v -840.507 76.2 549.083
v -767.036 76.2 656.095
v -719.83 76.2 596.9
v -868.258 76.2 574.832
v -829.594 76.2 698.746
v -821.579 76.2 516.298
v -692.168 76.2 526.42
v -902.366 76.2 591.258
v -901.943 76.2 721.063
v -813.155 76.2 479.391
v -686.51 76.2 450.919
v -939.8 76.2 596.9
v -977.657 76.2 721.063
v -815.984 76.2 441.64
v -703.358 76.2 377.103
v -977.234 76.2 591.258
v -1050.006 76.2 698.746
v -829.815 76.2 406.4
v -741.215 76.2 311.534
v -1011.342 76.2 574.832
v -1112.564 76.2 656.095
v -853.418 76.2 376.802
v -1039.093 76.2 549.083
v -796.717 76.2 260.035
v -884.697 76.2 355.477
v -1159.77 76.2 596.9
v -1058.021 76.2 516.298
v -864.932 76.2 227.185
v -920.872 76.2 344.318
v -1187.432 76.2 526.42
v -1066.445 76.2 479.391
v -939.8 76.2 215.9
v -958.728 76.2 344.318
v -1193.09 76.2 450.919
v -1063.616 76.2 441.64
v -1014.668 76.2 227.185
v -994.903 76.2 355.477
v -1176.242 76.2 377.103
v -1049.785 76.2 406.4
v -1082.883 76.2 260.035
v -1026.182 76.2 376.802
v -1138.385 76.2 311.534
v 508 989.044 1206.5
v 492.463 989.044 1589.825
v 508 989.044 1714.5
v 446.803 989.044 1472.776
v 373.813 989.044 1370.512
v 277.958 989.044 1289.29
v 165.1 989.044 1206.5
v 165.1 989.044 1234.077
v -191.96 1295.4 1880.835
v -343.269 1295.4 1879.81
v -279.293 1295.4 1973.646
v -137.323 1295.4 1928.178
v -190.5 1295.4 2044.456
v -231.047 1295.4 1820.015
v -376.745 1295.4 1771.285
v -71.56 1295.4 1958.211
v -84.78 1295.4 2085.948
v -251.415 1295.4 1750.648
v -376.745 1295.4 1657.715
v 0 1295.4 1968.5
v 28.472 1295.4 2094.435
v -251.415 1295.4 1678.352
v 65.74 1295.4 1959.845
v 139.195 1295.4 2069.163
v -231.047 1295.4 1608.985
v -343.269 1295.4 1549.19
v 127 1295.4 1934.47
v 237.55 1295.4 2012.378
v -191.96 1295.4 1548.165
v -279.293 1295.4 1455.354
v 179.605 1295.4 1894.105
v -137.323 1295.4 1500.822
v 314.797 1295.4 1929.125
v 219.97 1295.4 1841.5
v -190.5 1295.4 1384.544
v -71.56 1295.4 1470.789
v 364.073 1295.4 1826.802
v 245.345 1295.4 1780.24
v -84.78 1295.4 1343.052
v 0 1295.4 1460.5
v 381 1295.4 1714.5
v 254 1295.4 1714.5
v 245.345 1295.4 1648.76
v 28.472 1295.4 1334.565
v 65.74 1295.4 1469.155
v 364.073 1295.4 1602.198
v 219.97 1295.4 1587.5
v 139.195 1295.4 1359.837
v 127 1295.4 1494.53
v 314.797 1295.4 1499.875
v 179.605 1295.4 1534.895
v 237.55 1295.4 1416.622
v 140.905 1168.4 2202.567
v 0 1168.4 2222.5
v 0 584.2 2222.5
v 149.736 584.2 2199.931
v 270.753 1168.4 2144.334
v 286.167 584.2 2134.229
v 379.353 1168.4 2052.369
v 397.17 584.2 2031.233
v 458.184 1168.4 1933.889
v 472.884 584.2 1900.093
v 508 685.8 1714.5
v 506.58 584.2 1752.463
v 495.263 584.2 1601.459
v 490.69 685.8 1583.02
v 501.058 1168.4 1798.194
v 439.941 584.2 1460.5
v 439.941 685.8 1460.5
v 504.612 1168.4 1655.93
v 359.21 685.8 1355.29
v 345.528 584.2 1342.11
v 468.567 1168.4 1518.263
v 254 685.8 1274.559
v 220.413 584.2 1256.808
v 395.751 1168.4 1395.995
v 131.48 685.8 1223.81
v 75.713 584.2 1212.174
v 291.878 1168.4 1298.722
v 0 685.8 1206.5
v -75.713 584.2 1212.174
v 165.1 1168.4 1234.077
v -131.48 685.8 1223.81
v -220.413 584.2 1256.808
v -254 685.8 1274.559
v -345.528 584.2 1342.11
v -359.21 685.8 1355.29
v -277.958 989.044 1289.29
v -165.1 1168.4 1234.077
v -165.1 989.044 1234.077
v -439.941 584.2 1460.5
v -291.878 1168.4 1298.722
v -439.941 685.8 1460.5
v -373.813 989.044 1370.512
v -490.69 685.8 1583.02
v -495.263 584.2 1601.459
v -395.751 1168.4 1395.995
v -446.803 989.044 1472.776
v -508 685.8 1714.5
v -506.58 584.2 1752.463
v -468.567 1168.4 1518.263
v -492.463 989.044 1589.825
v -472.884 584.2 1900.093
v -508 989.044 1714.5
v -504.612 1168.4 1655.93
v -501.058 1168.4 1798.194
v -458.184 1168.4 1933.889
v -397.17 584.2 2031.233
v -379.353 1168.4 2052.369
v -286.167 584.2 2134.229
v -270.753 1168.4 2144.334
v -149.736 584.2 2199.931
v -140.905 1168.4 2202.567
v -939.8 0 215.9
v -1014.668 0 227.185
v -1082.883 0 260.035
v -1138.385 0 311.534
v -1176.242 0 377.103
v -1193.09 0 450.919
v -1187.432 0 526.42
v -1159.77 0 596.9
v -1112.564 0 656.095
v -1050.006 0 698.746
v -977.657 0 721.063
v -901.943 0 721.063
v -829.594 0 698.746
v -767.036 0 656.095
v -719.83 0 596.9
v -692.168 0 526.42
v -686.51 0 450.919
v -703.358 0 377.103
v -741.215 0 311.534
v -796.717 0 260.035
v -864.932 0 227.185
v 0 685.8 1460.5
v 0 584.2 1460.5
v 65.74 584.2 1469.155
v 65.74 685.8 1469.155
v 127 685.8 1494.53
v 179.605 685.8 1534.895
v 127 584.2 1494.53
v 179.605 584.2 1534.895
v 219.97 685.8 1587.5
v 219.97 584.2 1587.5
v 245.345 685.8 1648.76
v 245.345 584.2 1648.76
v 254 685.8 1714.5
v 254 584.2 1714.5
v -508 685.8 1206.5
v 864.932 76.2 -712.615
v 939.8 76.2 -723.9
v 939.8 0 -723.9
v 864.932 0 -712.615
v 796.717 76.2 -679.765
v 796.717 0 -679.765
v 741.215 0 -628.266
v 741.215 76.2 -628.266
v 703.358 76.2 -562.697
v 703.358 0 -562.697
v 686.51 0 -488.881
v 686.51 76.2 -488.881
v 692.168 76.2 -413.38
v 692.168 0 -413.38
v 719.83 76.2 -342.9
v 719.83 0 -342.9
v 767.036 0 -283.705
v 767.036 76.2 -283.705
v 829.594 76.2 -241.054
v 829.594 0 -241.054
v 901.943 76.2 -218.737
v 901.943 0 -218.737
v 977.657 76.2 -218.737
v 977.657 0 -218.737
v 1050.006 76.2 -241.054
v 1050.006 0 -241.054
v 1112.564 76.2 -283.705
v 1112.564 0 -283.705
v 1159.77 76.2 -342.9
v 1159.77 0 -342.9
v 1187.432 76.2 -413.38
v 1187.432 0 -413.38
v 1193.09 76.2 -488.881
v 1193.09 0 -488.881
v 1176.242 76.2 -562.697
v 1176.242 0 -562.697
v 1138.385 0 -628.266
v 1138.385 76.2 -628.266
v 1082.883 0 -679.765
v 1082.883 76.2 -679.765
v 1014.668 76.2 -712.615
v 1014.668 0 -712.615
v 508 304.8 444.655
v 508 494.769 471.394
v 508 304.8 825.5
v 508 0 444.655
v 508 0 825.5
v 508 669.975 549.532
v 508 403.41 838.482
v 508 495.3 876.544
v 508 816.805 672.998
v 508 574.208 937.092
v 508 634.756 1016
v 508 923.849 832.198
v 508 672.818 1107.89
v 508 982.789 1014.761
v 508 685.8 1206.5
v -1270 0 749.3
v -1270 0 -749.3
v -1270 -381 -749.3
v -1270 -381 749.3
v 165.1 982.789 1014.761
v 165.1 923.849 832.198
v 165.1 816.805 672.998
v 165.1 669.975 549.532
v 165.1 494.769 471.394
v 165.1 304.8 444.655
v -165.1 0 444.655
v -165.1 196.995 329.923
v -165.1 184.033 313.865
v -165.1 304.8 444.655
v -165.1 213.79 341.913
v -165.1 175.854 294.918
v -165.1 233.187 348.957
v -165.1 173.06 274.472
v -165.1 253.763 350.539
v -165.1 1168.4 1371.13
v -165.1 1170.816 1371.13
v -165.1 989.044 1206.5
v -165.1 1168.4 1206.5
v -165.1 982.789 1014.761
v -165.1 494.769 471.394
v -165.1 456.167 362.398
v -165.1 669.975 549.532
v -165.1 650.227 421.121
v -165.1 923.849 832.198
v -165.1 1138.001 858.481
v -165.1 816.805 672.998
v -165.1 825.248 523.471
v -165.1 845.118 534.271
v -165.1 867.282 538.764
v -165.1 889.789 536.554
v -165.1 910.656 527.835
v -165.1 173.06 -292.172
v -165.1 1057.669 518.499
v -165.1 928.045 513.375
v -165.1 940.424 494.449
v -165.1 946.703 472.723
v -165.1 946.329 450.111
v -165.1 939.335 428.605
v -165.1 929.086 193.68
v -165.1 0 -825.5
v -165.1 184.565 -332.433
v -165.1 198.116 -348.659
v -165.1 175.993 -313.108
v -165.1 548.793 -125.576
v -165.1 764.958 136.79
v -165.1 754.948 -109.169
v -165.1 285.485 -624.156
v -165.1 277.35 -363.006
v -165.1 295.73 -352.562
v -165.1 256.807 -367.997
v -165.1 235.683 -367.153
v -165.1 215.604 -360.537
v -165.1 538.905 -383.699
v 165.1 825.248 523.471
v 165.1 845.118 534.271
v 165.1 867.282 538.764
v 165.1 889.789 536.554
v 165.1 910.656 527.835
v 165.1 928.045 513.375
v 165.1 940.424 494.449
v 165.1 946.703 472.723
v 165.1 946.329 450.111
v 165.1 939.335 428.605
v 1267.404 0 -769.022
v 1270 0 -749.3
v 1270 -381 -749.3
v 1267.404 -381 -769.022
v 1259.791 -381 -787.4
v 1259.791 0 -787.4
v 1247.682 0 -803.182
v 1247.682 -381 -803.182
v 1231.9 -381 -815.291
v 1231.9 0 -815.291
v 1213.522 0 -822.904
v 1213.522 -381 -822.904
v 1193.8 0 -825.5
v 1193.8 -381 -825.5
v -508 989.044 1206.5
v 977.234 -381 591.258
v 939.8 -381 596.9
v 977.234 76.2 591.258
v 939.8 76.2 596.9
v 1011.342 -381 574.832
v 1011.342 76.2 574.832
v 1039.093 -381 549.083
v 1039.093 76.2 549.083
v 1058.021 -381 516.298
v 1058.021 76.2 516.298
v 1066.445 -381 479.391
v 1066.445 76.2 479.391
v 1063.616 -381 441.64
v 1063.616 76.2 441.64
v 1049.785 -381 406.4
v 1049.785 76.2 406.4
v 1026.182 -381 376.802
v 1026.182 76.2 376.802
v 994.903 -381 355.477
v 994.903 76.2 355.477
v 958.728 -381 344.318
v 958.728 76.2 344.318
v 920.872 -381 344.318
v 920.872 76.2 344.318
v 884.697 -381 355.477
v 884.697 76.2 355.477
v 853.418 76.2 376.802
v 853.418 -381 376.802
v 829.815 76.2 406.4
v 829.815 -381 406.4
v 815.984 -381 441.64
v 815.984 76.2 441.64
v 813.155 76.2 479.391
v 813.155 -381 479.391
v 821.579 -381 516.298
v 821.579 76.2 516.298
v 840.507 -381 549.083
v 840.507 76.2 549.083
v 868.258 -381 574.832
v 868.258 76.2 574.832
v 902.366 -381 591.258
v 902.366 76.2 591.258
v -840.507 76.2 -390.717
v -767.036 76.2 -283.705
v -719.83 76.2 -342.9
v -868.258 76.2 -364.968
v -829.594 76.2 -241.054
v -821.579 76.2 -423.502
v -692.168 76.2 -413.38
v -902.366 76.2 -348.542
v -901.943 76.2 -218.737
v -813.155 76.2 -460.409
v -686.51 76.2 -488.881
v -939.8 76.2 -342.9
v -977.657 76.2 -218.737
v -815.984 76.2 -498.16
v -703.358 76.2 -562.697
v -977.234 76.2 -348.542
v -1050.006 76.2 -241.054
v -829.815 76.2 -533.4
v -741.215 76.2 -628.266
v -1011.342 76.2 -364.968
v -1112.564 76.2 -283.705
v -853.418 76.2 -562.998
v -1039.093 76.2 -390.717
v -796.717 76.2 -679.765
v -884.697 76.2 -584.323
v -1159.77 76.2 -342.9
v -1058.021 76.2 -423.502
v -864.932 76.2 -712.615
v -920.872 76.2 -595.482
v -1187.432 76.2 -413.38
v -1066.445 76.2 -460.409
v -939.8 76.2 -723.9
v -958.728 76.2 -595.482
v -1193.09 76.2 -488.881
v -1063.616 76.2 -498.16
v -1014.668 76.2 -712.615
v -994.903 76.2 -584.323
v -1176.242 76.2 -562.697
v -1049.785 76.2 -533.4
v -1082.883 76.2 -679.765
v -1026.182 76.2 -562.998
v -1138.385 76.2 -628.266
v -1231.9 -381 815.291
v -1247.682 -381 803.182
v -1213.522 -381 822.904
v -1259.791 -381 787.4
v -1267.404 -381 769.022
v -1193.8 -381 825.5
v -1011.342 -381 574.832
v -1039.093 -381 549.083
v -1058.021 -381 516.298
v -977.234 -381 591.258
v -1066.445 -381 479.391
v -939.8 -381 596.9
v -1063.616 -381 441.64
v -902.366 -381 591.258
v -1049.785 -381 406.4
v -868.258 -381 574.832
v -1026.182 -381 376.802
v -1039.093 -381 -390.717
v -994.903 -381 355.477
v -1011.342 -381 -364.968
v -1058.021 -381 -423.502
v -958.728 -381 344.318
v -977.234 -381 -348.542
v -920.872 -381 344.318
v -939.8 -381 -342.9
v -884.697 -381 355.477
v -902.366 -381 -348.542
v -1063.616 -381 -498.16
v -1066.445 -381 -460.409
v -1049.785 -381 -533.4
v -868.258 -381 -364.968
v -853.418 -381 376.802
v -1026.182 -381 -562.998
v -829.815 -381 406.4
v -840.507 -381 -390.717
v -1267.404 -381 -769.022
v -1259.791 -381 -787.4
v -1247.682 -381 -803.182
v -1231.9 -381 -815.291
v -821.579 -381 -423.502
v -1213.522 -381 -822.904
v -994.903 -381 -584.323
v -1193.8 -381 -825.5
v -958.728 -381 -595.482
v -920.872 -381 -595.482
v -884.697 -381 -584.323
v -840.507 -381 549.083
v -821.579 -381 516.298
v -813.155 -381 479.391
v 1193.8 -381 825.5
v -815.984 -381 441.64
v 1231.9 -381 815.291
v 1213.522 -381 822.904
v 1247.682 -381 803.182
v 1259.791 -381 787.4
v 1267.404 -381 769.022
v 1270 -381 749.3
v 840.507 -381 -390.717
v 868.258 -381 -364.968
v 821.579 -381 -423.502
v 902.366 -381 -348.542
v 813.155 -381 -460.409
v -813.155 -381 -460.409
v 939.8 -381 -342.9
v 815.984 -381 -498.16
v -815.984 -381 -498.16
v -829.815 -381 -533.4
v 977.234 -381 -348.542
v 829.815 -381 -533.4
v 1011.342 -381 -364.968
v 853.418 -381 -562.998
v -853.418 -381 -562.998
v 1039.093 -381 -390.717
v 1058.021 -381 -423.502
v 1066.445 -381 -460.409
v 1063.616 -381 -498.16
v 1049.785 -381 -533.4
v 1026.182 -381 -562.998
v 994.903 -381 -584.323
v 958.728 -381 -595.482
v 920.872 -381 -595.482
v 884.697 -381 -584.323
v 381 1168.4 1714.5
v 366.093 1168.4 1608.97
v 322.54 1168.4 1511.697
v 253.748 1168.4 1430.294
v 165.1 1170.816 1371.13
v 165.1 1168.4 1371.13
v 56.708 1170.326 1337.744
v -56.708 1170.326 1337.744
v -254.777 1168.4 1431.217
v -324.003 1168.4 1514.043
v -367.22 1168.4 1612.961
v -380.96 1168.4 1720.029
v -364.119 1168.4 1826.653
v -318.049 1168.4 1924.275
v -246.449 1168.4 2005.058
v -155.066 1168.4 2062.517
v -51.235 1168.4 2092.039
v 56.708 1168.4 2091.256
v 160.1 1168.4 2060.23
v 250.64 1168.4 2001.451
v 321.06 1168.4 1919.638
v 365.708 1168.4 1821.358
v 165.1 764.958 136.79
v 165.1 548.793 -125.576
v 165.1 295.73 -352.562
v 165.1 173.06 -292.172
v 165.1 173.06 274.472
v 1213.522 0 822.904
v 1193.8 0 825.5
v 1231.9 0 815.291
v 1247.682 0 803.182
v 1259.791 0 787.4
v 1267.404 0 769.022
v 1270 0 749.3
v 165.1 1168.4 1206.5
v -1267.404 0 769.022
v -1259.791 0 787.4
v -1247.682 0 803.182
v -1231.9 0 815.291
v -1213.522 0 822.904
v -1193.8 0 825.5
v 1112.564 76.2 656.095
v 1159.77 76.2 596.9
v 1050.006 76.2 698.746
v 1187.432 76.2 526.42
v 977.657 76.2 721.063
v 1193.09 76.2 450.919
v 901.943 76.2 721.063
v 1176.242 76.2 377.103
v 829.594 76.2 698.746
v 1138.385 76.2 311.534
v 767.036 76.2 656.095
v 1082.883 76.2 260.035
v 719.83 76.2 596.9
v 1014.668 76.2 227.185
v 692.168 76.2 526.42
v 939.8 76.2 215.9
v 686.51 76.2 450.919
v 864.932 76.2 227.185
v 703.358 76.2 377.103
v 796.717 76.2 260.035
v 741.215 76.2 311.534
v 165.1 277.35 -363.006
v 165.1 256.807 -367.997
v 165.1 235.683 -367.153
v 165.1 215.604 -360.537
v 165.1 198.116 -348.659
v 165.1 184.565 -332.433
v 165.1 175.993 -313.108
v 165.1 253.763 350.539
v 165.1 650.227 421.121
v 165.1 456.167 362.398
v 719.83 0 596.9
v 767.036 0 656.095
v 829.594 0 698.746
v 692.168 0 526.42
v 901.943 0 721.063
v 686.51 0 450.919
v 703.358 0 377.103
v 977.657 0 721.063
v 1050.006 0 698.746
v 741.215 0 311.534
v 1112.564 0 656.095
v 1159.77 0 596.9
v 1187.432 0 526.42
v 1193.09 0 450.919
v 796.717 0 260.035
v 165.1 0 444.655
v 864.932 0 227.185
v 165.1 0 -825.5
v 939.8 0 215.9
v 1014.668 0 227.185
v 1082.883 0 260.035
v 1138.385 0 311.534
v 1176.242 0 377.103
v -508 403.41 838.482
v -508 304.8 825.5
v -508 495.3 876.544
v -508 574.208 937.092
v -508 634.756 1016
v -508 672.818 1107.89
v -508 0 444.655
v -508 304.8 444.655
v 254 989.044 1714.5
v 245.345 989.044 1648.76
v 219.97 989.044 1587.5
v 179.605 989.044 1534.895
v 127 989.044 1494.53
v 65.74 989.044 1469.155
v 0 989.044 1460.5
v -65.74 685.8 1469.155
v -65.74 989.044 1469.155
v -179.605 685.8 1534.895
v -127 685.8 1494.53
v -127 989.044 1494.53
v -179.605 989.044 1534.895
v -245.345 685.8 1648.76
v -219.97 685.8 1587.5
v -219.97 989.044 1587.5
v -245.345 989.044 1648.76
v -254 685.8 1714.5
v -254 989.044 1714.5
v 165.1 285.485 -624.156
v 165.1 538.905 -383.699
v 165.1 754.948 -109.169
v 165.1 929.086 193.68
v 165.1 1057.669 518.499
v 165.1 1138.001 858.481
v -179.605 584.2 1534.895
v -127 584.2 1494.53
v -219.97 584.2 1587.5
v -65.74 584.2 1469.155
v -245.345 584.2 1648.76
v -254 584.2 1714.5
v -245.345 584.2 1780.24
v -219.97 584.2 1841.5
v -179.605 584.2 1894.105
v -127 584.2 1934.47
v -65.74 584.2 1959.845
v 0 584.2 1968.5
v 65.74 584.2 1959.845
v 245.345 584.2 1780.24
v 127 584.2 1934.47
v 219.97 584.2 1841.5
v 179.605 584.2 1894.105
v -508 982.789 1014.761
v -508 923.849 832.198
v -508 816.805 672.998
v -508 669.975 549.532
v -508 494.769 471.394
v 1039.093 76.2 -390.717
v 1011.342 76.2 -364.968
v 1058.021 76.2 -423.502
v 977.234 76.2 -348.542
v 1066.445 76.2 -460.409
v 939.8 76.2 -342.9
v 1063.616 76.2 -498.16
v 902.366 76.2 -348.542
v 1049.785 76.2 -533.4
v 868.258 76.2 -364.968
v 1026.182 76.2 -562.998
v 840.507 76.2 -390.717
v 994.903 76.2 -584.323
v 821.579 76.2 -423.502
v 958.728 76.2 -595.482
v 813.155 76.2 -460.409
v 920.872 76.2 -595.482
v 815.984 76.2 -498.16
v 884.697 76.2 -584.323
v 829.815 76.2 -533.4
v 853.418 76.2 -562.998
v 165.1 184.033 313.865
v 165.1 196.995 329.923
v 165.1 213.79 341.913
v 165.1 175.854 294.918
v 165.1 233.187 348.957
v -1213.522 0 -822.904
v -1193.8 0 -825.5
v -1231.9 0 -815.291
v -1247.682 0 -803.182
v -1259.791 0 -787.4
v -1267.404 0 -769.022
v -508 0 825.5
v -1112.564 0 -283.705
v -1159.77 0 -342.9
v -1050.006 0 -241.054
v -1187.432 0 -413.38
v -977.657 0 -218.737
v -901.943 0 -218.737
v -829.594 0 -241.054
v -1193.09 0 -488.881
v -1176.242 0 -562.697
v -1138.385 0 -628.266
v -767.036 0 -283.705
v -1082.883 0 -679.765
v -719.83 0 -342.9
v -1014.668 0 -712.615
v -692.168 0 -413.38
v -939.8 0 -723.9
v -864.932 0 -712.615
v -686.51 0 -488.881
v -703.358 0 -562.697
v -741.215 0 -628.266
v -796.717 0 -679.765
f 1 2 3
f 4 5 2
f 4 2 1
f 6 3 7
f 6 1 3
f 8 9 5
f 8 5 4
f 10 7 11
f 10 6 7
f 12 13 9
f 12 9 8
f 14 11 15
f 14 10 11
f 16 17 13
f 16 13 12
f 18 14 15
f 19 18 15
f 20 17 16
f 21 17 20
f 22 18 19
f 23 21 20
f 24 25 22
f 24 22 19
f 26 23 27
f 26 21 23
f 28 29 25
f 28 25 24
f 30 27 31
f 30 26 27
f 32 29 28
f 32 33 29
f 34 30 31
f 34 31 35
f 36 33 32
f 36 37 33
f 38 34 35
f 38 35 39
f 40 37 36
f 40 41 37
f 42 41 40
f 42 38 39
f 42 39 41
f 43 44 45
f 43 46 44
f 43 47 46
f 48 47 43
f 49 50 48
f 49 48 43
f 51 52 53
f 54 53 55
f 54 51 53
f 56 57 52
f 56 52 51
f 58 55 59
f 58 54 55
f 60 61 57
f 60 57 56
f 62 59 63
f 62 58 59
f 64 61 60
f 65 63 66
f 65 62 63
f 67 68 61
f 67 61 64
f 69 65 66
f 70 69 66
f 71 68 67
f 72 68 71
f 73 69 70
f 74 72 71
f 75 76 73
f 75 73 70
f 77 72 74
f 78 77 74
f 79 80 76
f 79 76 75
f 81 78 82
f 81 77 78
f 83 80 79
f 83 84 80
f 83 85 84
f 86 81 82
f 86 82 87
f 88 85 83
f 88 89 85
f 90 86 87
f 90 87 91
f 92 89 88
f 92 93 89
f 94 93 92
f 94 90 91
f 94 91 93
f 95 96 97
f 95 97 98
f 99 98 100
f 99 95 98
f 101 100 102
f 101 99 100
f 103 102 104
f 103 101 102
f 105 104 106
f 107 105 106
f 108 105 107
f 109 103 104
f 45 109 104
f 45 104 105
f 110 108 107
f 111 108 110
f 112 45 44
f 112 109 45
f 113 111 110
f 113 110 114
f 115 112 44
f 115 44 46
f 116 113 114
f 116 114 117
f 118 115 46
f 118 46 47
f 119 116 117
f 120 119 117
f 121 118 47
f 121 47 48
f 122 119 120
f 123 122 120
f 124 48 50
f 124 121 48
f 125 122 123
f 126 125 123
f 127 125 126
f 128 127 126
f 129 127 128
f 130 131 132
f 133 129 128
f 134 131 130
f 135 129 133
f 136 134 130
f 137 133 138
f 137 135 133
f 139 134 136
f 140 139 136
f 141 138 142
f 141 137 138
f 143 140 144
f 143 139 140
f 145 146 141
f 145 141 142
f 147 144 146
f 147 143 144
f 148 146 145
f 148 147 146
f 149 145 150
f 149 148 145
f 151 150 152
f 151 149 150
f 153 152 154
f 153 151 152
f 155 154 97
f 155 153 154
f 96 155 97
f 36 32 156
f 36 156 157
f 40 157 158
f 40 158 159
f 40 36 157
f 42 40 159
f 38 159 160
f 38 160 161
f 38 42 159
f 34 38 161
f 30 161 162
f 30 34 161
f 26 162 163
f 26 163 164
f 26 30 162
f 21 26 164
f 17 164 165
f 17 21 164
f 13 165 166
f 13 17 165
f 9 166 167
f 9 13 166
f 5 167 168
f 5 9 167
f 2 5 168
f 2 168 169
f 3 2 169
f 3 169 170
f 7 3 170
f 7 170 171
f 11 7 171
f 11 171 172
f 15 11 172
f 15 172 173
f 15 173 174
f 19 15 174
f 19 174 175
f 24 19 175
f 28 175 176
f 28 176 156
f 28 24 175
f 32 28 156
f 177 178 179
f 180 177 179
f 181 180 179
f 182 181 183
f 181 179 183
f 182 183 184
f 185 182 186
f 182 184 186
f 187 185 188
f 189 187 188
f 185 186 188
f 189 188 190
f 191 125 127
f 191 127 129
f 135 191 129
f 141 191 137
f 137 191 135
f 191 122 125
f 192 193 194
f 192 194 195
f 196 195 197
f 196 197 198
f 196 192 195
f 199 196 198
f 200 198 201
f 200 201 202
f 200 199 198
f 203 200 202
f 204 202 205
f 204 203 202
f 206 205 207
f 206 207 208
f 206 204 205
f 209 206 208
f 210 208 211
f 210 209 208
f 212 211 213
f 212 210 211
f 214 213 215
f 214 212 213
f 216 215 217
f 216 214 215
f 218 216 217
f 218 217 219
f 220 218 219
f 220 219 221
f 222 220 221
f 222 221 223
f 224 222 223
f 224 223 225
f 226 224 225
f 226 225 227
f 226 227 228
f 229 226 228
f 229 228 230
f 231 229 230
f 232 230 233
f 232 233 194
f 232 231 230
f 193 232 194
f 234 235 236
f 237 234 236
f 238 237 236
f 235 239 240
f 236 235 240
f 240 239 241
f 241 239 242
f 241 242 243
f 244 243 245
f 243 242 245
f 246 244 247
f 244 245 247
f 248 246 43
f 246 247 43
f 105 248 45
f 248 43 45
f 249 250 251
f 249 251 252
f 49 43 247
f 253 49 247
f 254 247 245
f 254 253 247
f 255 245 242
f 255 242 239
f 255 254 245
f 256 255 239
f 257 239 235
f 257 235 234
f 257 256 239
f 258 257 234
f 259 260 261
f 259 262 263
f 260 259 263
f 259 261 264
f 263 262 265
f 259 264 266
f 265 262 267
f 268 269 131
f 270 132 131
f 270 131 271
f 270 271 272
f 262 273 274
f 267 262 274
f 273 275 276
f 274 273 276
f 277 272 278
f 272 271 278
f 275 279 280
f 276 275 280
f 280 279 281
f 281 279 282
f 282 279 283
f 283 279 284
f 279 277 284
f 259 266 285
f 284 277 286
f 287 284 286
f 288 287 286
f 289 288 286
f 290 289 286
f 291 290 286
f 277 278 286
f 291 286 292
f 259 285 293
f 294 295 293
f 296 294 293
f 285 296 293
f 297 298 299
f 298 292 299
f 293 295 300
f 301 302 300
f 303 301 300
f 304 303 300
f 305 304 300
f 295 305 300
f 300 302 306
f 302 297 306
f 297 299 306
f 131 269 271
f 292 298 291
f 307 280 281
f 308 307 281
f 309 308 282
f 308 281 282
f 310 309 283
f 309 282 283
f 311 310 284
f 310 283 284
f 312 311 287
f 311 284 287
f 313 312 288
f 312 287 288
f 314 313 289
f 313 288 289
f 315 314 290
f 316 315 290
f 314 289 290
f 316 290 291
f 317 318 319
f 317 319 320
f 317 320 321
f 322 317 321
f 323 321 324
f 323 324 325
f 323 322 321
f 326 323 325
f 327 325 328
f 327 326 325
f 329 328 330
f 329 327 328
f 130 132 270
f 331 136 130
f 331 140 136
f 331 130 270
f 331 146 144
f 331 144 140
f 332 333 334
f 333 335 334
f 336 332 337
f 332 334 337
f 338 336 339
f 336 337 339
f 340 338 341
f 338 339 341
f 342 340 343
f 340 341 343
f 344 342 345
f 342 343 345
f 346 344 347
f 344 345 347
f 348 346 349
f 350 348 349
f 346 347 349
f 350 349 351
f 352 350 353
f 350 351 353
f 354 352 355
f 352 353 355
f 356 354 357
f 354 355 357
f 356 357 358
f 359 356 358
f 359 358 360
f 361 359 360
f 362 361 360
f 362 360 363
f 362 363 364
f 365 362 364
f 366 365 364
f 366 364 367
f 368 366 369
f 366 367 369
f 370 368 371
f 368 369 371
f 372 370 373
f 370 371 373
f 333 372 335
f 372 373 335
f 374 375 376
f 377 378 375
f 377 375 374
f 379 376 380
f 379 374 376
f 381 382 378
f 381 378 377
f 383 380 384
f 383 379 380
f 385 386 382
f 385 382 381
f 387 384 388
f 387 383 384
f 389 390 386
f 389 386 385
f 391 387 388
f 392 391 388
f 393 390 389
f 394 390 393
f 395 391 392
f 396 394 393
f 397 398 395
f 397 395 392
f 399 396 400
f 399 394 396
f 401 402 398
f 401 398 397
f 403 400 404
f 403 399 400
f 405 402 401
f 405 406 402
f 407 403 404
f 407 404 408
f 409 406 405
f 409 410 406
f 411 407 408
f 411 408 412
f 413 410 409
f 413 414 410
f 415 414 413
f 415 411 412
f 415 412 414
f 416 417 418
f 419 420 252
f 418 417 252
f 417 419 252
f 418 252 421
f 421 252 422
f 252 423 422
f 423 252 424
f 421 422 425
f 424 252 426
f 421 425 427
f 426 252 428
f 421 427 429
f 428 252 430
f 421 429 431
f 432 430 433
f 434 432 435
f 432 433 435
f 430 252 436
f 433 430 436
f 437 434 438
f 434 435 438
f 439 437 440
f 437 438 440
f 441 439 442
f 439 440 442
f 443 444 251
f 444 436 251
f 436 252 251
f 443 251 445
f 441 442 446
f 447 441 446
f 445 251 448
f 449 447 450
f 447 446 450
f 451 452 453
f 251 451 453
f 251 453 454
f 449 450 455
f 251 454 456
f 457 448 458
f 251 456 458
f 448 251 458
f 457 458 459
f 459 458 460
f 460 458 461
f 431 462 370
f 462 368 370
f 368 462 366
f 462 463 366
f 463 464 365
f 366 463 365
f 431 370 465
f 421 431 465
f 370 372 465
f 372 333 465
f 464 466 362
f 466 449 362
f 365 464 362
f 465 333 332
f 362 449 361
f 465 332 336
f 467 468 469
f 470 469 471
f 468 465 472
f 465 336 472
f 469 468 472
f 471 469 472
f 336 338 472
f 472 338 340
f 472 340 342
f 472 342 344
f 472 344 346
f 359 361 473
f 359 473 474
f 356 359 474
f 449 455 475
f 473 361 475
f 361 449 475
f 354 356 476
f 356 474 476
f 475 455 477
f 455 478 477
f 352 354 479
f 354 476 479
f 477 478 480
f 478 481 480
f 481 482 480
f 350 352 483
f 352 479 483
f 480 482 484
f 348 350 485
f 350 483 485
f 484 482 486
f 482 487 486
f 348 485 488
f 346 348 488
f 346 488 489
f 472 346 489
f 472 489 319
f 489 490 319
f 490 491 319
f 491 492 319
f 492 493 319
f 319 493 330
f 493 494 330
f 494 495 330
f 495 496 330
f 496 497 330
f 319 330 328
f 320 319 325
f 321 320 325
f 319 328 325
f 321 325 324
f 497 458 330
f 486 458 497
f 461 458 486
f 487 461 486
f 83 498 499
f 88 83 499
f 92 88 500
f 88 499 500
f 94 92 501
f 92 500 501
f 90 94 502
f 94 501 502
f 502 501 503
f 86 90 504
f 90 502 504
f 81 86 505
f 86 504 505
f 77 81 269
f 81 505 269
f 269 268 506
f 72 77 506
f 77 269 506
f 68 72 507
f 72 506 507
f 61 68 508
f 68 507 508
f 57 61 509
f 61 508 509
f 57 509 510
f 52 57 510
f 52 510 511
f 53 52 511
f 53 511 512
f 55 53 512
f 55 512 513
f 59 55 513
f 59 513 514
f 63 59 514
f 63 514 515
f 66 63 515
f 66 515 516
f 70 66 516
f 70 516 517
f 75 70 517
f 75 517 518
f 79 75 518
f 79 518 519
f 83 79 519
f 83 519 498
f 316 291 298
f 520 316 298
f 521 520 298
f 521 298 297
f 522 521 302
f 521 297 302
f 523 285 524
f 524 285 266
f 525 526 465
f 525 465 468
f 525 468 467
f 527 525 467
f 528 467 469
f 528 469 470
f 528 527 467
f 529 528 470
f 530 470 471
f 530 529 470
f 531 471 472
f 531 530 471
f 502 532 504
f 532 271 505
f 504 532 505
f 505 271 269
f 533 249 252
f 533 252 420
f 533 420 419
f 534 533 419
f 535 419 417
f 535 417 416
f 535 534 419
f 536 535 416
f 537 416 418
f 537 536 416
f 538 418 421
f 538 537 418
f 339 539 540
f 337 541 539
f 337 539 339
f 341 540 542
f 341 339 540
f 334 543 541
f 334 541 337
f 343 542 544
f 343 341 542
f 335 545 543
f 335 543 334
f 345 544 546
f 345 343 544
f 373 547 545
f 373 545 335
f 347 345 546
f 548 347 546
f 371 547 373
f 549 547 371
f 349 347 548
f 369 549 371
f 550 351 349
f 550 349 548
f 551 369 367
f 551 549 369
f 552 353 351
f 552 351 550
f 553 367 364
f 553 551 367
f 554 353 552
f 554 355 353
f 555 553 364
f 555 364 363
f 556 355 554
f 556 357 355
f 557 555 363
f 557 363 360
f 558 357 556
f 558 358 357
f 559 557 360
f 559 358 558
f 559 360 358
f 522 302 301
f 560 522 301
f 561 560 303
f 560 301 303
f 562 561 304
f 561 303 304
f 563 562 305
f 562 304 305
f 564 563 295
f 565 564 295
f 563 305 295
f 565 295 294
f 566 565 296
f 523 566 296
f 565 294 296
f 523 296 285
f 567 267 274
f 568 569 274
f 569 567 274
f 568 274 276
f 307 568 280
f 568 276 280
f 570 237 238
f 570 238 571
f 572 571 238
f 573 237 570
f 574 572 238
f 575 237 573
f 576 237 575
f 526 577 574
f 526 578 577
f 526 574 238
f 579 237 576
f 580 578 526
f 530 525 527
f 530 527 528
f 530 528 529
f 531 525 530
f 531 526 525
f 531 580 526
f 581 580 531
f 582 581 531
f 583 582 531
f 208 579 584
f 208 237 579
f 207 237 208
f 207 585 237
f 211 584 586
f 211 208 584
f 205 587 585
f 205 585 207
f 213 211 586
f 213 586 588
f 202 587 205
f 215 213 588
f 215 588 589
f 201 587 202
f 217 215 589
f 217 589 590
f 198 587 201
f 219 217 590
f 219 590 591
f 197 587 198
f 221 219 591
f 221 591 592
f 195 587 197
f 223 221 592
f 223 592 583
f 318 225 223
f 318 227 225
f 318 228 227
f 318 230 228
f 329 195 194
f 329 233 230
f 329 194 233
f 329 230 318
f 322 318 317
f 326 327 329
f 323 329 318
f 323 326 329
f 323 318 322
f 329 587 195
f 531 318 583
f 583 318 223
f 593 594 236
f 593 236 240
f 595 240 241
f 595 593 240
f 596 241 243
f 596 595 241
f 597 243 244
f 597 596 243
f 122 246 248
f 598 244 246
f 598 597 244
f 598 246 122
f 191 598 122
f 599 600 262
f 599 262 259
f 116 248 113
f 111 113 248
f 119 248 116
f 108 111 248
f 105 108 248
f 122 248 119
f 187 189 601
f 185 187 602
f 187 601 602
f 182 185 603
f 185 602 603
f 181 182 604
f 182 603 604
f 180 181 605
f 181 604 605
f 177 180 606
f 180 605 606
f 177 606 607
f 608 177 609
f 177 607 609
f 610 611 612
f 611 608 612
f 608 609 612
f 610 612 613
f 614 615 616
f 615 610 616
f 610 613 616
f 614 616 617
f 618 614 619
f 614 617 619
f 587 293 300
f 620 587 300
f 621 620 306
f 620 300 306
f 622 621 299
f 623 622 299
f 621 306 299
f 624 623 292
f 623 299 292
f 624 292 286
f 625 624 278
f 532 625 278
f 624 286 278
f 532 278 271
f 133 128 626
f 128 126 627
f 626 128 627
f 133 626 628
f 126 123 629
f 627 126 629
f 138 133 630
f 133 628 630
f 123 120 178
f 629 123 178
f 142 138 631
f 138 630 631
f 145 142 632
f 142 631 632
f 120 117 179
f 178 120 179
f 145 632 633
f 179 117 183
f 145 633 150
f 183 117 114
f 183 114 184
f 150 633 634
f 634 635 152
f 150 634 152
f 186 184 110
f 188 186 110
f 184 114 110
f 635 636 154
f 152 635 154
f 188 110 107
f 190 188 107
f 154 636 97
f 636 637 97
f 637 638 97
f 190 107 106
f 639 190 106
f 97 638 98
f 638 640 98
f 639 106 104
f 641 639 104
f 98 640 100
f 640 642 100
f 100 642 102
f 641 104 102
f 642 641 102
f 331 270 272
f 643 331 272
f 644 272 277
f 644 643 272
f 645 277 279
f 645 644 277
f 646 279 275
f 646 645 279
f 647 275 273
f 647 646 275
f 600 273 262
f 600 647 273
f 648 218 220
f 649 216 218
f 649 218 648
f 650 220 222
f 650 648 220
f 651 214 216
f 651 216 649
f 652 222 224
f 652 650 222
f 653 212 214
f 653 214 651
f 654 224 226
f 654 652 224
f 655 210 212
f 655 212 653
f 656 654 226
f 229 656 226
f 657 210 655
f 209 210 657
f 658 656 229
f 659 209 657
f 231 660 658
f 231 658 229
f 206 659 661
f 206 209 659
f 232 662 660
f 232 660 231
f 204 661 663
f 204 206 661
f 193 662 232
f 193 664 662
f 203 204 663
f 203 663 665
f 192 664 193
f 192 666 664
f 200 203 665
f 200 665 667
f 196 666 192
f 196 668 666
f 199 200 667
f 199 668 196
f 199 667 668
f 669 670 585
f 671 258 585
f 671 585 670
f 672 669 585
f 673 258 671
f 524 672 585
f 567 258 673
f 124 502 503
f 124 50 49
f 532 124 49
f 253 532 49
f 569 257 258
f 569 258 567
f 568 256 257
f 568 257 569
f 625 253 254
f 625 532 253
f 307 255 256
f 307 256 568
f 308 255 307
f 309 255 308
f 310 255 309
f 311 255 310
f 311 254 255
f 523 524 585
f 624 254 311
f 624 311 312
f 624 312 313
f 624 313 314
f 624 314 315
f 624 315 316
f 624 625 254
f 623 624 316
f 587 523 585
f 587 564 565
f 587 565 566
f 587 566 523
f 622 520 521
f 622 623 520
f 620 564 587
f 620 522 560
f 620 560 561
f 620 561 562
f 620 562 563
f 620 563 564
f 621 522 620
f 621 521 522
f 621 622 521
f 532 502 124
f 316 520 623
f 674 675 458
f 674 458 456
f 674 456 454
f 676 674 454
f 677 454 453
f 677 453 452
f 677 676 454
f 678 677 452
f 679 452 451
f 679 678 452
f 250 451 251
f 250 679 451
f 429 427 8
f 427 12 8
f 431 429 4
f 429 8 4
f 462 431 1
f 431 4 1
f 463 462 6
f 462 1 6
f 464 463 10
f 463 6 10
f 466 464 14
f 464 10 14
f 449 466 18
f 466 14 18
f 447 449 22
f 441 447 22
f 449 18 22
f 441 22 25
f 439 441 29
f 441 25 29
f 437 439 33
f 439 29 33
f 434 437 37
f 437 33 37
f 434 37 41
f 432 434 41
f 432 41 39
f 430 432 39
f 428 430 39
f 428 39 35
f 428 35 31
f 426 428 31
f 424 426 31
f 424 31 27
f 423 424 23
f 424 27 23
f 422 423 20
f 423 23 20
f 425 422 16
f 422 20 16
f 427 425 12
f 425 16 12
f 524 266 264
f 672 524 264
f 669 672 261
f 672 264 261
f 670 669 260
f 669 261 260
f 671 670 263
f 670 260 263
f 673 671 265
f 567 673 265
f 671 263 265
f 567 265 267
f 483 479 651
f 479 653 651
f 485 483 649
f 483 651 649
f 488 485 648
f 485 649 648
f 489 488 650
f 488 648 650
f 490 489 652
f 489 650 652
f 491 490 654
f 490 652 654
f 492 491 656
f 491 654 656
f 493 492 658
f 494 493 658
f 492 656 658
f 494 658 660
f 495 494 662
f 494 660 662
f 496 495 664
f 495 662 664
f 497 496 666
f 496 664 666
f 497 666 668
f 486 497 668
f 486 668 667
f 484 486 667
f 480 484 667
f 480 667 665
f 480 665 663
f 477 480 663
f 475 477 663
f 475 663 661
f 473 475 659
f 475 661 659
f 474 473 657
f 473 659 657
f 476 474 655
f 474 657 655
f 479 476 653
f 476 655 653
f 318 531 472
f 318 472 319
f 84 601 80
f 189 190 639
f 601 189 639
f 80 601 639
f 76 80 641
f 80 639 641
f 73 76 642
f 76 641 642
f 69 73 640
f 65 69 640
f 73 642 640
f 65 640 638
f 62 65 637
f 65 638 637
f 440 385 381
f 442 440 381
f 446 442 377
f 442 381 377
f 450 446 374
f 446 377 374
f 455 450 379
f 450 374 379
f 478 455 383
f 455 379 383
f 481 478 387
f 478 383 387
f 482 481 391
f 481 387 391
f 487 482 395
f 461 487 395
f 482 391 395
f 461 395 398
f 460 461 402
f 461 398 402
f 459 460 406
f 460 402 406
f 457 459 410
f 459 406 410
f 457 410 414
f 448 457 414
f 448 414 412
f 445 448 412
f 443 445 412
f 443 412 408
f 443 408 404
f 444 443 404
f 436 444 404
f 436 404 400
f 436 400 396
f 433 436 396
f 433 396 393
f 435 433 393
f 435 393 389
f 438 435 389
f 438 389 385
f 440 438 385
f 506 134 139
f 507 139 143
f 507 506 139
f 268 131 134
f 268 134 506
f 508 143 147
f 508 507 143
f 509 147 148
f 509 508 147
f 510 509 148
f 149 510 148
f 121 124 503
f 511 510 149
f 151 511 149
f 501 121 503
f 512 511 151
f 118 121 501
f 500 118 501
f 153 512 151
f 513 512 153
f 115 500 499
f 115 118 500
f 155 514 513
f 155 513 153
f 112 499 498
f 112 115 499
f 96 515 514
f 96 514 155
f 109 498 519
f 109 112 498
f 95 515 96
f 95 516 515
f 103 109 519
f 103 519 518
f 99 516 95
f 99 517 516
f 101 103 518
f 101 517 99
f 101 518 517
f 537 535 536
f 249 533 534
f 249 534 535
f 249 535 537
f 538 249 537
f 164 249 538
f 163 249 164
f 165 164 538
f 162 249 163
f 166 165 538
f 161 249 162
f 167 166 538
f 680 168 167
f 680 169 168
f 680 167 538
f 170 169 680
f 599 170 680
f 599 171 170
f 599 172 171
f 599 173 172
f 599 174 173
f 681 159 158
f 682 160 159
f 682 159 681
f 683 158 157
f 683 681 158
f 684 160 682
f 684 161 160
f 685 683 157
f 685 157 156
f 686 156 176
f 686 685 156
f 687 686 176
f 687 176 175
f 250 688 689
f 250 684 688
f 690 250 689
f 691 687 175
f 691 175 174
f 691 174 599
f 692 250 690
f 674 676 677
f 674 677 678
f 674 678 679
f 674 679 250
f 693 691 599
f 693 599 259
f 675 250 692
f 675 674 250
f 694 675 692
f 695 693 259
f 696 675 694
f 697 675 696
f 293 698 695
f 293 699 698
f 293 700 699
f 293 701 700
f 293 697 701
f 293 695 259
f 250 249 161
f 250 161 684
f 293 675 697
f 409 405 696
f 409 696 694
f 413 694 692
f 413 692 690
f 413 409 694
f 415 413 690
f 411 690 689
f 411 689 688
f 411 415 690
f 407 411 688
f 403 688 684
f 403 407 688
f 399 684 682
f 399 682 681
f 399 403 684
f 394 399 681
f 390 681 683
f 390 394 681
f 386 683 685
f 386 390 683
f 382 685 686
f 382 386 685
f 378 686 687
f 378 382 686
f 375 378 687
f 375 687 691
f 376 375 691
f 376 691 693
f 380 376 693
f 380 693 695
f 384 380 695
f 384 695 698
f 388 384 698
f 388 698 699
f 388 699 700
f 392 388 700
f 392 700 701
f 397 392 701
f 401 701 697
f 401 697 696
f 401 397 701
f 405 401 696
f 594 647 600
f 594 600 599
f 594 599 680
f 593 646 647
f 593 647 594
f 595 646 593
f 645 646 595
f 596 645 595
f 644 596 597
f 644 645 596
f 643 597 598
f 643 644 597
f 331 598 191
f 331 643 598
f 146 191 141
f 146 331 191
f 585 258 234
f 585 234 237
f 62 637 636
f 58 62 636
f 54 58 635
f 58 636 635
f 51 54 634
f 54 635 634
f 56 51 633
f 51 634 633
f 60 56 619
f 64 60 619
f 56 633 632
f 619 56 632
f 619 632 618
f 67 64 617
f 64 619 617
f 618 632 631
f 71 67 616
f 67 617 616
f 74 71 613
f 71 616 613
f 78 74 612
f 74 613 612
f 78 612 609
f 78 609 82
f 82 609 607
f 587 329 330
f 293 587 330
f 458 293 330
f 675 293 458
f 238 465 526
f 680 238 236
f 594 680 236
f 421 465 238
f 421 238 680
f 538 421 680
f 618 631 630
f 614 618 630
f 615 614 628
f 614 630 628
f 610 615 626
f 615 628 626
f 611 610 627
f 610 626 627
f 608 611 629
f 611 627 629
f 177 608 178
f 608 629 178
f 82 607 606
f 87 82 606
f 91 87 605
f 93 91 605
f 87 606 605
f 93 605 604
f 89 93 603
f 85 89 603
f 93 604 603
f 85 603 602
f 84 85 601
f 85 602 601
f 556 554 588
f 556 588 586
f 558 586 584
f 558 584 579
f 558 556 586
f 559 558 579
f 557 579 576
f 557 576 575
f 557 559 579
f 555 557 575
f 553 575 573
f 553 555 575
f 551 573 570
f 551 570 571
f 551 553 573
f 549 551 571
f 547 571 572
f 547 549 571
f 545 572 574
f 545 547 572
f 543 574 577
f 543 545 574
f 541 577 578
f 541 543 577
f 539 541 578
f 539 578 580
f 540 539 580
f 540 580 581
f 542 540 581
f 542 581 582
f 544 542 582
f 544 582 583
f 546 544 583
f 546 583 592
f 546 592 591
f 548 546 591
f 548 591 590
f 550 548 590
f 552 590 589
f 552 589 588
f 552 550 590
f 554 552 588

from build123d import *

# Parameters (mm, degrees)
SKETCH5_R                = 254
SKETCH5_R_2              = 127
BOSS_EXTRUDE2_DEPTH      = 381
BOSS_EXTRUDE3_START      = 76.2
SKETCH5_5_R              = 254
SKETCH5_5_R_2            = 127
BOSS_EXTRUDE3_DEPTH      = 76.2
SKETCH6_R                = 508
SKETCH6_R_2              = 381
BOSS_EXTRUDE4_DEPTH      = 584.2
BOSS_EXTRUDE5_DEPTH      = 127
BOSS_EXTRUDE5_DEPTH_BACK = 584.2
BOSS_EXTRUDE6_DEPTH      = 508
BOSS_EXTRUDE6_DEPTH_BACK = 508
CUT_EXTRUDE1_DEPTH       = 2904.34744305
RIB1_START               = -165.1
RIB1_DEPTH               = 330.2
CUT_EXTRUDE2_DEPTH       = 508
CUT_EXTRUDE2_DEPTH_BACK  = 508


# Read off the part's stored shape, not the designer's step: Rib1
with BuildPart() as part:
    # Sketch5 → Boss-Extrude2 (new body)
    # profile 1 of 5: a face of its own
    with BuildSketch(Plane(origin=(0, 0, 0), x_dir=(1, 0, 0), z_dir=(0, 1, 0))):
        with BuildLine():
            Line((-1193.8, -825.5), (1193.8, -825.5))
            ThreePointArc((1193.8, -825.5), (1247.681536726, -803.181536726), (1270, -749.3))
            Line((1270, -749.3), (1270, 749.3))
            ThreePointArc((1270, 749.3), (1247.681536726, 803.181536726), (1193.8, 825.5))
            Line((1193.8, 825.5), (-1193.8, 825.5))
            ThreePointArc((-1193.8, 825.5), (-1247.681536726, 803.181536726), (-1270, 749.3))
            Line((-1270, 749.3), (-1270, -749.3))
            ThreePointArc((-1270, -749.3), (-1247.681536726, -803.181536726), (-1193.8, -825.5))
        make_face()
        with Locations((939.8, -469.9)):
            Circle(SKETCH5_R, mode=Mode.SUBTRACT)
        with Locations((-939.8, 469.9)):
            Circle(SKETCH5_R, mode=Mode.SUBTRACT)
        with Locations((939.8, 469.9)):
            Circle(SKETCH5_R, mode=Mode.SUBTRACT)
        with Locations((-939.8, -469.9)):
            Circle(SKETCH5_R, mode=Mode.SUBTRACT)
    # profile 2 of 5: a face of its own
    with BuildSketch(Plane(origin=(0, 0, 0), x_dir=(1, 0, 0), z_dir=(0, 1, 0))):
        with Locations((-939.8, 469.9)):
            Circle(SKETCH5_R)
        with Locations(Location((-939.8, 469.9, 0), (0, 0, 270))):
            Circle(SKETCH5_R_2, mode=Mode.SUBTRACT)
    # profile 3 of 5: a face of its own
    with BuildSketch(Plane(origin=(0, 0, 0), x_dir=(1, 0, 0), z_dir=(0, 1, 0))):
        with Locations((-939.8, -469.9)):
            Circle(SKETCH5_R)
        with Locations(Location((-939.8, -469.9, 0), (0, 0, 270))):
            Circle(SKETCH5_R_2, mode=Mode.SUBTRACT)
    # profile 4 of 5: a face of its own
    with BuildSketch(Plane(origin=(0, 0, 0), x_dir=(1, 0, 0), z_dir=(0, 1, 0))):
        with Locations((939.8, -469.9)):
            Circle(SKETCH5_R)
        with Locations(Location((939.8, -469.9, 0), (0, 0, 270))):
            Circle(SKETCH5_R_2, mode=Mode.SUBTRACT)
    # profile 5 of 5: a face of its own
    with BuildSketch(Plane(origin=(0, 0, 0), x_dir=(1, 0, 0), z_dir=(0, 1, 0))):
        with Locations((939.8, 469.9)):
            Circle(SKETCH5_R)
        with Locations(Location((939.8, 469.9, 0), (0, 0, 270))):
            Circle(SKETCH5_R_2, mode=Mode.SUBTRACT)
    extrude(amount=-BOSS_EXTRUDE2_DEPTH)

    # Sketch5<5> → Boss-Extrude3 (add)
    # profile 1 of 4: a face of its own
    with BuildSketch(Plane(origin=(0, 0, 0), x_dir=(1, 0, 0), z_dir=(0, 1, 0)).offset(BOSS_EXTRUDE3_START)):
        with Locations(Location((-939.8, 469.9, 0), (0, 0, 90))):
            Circle(SKETCH5_5_R)
        with Locations(Location((-939.8, 469.9, 0), (0, 0, 270))):
            Circle(SKETCH5_5_R_2, mode=Mode.SUBTRACT)
    # profile 2 of 4: a face of its own
    with BuildSketch(Plane(origin=(0, 0, 0), x_dir=(1, 0, 0), z_dir=(0, 1, 0)).offset(BOSS_EXTRUDE3_START)):
        with Locations(Location((-939.8, -469.9, 0), (0, 0, 90))):
            Circle(SKETCH5_5_R)
        with Locations(Location((-939.8, -469.9, 0), (0, 0, 270))):
            Circle(SKETCH5_5_R_2, mode=Mode.SUBTRACT)
    # profile 3 of 4: a face of its own
    with BuildSketch(Plane(origin=(0, 0, 0), x_dir=(1, 0, 0), z_dir=(0, 1, 0)).offset(BOSS_EXTRUDE3_START)):
        with Locations(Location((939.8, 469.9, 0), (0, 0, 90))):
            Circle(SKETCH5_5_R)
        with Locations(Location((939.8, 469.9, 0), (0, 0, 270))):
            Circle(SKETCH5_5_R_2, mode=Mode.SUBTRACT)
    # profile 4 of 4: a face of its own
    with BuildSketch(Plane(origin=(0, 0, 0), x_dir=(1, 0, 0), z_dir=(0, 1, 0)).offset(BOSS_EXTRUDE3_START)):
        with Locations(Location((939.8, -469.9, 0), (0, 0, 90))):
            Circle(SKETCH5_5_R)
        with Locations(Location((939.8, -469.9, 0), (0, 0, 270))):
            Circle(SKETCH5_5_R_2, mode=Mode.SUBTRACT)
    extrude(amount=-BOSS_EXTRUDE3_DEPTH)



with BuildPart() as body_2:
    # Sketch6 → Boss-Extrude4 (new body)
    with BuildSketch(Plane(origin=(0, 1168.4, 0), x_dir=(1, 0, 0), z_dir=(0, 1, 0))):
        with Locations(Location((0, -1714.5, 0), (0, 0, 270))):
            Circle(SKETCH6_R)
        with Locations(Location((0, -1714.5, 0), (0, 0, 270))):
            Circle(SKETCH6_R_2, mode=Mode.SUBTRACT)
    extrude(amount=-BOSS_EXTRUDE4_DEPTH)

    # Sketch6<5> → Boss-Extrude5 (add, two sides: drawn at the far end of the back side and taken through both)
    with BuildSketch(Plane(origin=(0, 1168.4, 0), x_dir=(1, 0, 0), z_dir=(0, 1, 0)).offset(-BOSS_EXTRUDE5_DEPTH_BACK)):
        with BuildLine():
            ThreePointArc((381, -1714.5), (269.407683632, -1445.092316368), (0, -1333.5))
            Line((0, -1333.5), (0, -1460.5))
            ThreePointArc((0, -1460.5), (179.605122421, -1534.894877579), (254, -1714.5))
            ThreePointArc((254, -1714.5), (179.605122421, -1894.105122421), (0, -1968.5))
            Line((0, -1968.5), (0, -2095.5))
            ThreePointArc((0, -2095.5), (269.407683632, -1983.907683632), (381, -1714.5))
        make_face()
        with BuildLine():
            Line((0, -1460.5), (0, -1333.5))
            ThreePointArc((0, -1333.5), (-381, -1714.5), (0, -2095.5))
            Line((0, -2095.5), (0, -1968.5))
            ThreePointArc((0, -1968.5), (-254, -1714.5), (0, -1460.5))
        make_face()
        with BuildLine():
            ThreePointArc((381, -1714.5), (269.407683632, -1445.092316368), (0, -1333.5))
            Line((0, -1333.5), (0, -1460.5))
            ThreePointArc((0, -1460.5), (179.605122421, -1534.894877579), (254, -1714.5))
            ThreePointArc((254, -1714.5), (179.605122421, -1894.105122421), (0, -1968.5))
            Line((0, -1968.5), (0, -2095.5))
            ThreePointArc((0, -2095.5), (269.407683632, -1983.907683632), (381, -1714.5))
        make_face()
        with BuildLine():
            Line((0, -1460.5), (0, -1333.5))
            ThreePointArc((0, -1333.5), (-381, -1714.5), (0, -2095.5))
            Line((0, -2095.5), (0, -1968.5))
            ThreePointArc((0, -1968.5), (-254, -1714.5), (0, -1460.5))
        make_face()
    extrude(amount=BOSS_EXTRUDE5_DEPTH + BOSS_EXTRUDE5_DEPTH_BACK)


with BuildPart() as part_1:
    add(part.part)

    add(body_2.part)  # Boss-Extrude6 merges body 2
    # Sketch11 → Boss-Extrude6 (add, two sides: drawn at the far end of the back side and taken through both)
    with BuildSketch(Plane(origin=(0, 0, 0), x_dir=(0, 0, -1), z_dir=(1, 0, 0)).offset(-BOSS_EXTRUDE6_DEPTH_BACK)):
        with BuildLine():
            Line((-825.5, 0), (-825.5, 304.8))
            ThreePointArc((-825.5, 304.8), (-937.092316368, 574.207683632), (-1206.5, 685.8))
            Line((-1206.5, 685.8), (-1714.5, 685.8))
            Line((-1714.5, 685.8), (-1714.5, 989.043840563))
            Line((-1714.5, 989.043840563), (-1206.5, 989.043840563))
            ThreePointArc((-1206.5, 989.043840563), (-672.998317557, 816.80529258), (-444.654841735, 304.8))
            Line((-444.654841735, 304.8), (-444.654841735, 0))
            Line((-444.654841735, 0), (-825.5, 0))
        make_face()
    extrude(amount=BOSS_EXTRUDE6_DEPTH + BOSS_EXTRUDE6_DEPTH_BACK)

    # Sketch12 → Cut-Extrude1 (cut, through all)
    with BuildSketch(Plane(origin=(0, 989.043840563, 0), x_dir=(1, 0, 0), z_dir=(0, 1, 0))):
        with BuildLine():
            Line((-254, -1714.5), (254, -1714.5))
            ThreePointArc((254, -1714.5), (0, -1460.5), (-254, -1714.5))
        make_face()
    extrude(amount=-CUT_EXTRUDE1_DEPTH, mode=Mode.SUBTRACT)

    # Rib1 outline → Rib1 (add)
    with BuildSketch(Plane(origin=(0, 0, 0), x_dir=(0, 0, -1), z_dir=(1, 0, 0)).offset(RIB1_START)):
        with BuildLine():
            Line((-1373, 1170.843638094), (-1373, 971.12248932))
            Line((-1373, 971.12248932), (-1206.5, 989.043840563))
            ThreePointArc((-1206.5, 989.043840563), (-672.998317557, 816.80529258), (-444.654841735, 304.8))
            Line((-444.654841735, 304.8), (-444.654841735, 0))
            Line((-444.654841735, 0), (825.5, 0))
            ThreePointArc((825.5, 0), (-39.099770382, 847.504747162), (-1206.5, 1168.4))
            Line((-1206.5, 1168.4), (-1371.129951801, 1170.816192322))
            Line((-1371.129951801, 1170.816192322), (-1373, 1170.843638094))
        make_face()
    extrude(amount=RIB1_DEPTH)

    # Sketch15 → Cut-Extrude2 (cut, two sides: drawn at the far end of the back side and taken through both)
    with BuildSketch(Plane(origin=(0, 0, 0), x_dir=(0, 0, -1), z_dir=(1, 0, 0)).offset(-CUT_EXTRUDE2_DEPTH_BACK)):
        with BuildLine():
            Line((292.172139573, 173.059996376), (-274.471730256, 173.059996376))
            ThreePointArc((-274.471730256, 173.059996376), (-329.922551519, 196.994841433), (-350.538548236, 253.763239913))
            ThreePointArc((-350.538548236, 253.763239913), (-386.044795403, 554.926490817), (-523.471382692, 825.24839224))
            ThreePointArc((-523.471382692, 825.24839224), (-521.253789027, 919.88991283), (-428.604921426, 939.335284348))
            ThreePointArc((-428.604921426, 939.335284348), (-1.537872903, 661.814311273), (352.562032735, 295.730425725))
            ThreePointArc((352.562032735, 295.730425725), (360.536921136, 215.604437522), (292.172139573, 173.059996376))
        make_face()
    extrude(amount=CUT_EXTRUDE2_DEPTH + CUT_EXTRUDE2_DEPTH_BACK, mode=Mode.SUBTRACT)


solid = part_1.part
